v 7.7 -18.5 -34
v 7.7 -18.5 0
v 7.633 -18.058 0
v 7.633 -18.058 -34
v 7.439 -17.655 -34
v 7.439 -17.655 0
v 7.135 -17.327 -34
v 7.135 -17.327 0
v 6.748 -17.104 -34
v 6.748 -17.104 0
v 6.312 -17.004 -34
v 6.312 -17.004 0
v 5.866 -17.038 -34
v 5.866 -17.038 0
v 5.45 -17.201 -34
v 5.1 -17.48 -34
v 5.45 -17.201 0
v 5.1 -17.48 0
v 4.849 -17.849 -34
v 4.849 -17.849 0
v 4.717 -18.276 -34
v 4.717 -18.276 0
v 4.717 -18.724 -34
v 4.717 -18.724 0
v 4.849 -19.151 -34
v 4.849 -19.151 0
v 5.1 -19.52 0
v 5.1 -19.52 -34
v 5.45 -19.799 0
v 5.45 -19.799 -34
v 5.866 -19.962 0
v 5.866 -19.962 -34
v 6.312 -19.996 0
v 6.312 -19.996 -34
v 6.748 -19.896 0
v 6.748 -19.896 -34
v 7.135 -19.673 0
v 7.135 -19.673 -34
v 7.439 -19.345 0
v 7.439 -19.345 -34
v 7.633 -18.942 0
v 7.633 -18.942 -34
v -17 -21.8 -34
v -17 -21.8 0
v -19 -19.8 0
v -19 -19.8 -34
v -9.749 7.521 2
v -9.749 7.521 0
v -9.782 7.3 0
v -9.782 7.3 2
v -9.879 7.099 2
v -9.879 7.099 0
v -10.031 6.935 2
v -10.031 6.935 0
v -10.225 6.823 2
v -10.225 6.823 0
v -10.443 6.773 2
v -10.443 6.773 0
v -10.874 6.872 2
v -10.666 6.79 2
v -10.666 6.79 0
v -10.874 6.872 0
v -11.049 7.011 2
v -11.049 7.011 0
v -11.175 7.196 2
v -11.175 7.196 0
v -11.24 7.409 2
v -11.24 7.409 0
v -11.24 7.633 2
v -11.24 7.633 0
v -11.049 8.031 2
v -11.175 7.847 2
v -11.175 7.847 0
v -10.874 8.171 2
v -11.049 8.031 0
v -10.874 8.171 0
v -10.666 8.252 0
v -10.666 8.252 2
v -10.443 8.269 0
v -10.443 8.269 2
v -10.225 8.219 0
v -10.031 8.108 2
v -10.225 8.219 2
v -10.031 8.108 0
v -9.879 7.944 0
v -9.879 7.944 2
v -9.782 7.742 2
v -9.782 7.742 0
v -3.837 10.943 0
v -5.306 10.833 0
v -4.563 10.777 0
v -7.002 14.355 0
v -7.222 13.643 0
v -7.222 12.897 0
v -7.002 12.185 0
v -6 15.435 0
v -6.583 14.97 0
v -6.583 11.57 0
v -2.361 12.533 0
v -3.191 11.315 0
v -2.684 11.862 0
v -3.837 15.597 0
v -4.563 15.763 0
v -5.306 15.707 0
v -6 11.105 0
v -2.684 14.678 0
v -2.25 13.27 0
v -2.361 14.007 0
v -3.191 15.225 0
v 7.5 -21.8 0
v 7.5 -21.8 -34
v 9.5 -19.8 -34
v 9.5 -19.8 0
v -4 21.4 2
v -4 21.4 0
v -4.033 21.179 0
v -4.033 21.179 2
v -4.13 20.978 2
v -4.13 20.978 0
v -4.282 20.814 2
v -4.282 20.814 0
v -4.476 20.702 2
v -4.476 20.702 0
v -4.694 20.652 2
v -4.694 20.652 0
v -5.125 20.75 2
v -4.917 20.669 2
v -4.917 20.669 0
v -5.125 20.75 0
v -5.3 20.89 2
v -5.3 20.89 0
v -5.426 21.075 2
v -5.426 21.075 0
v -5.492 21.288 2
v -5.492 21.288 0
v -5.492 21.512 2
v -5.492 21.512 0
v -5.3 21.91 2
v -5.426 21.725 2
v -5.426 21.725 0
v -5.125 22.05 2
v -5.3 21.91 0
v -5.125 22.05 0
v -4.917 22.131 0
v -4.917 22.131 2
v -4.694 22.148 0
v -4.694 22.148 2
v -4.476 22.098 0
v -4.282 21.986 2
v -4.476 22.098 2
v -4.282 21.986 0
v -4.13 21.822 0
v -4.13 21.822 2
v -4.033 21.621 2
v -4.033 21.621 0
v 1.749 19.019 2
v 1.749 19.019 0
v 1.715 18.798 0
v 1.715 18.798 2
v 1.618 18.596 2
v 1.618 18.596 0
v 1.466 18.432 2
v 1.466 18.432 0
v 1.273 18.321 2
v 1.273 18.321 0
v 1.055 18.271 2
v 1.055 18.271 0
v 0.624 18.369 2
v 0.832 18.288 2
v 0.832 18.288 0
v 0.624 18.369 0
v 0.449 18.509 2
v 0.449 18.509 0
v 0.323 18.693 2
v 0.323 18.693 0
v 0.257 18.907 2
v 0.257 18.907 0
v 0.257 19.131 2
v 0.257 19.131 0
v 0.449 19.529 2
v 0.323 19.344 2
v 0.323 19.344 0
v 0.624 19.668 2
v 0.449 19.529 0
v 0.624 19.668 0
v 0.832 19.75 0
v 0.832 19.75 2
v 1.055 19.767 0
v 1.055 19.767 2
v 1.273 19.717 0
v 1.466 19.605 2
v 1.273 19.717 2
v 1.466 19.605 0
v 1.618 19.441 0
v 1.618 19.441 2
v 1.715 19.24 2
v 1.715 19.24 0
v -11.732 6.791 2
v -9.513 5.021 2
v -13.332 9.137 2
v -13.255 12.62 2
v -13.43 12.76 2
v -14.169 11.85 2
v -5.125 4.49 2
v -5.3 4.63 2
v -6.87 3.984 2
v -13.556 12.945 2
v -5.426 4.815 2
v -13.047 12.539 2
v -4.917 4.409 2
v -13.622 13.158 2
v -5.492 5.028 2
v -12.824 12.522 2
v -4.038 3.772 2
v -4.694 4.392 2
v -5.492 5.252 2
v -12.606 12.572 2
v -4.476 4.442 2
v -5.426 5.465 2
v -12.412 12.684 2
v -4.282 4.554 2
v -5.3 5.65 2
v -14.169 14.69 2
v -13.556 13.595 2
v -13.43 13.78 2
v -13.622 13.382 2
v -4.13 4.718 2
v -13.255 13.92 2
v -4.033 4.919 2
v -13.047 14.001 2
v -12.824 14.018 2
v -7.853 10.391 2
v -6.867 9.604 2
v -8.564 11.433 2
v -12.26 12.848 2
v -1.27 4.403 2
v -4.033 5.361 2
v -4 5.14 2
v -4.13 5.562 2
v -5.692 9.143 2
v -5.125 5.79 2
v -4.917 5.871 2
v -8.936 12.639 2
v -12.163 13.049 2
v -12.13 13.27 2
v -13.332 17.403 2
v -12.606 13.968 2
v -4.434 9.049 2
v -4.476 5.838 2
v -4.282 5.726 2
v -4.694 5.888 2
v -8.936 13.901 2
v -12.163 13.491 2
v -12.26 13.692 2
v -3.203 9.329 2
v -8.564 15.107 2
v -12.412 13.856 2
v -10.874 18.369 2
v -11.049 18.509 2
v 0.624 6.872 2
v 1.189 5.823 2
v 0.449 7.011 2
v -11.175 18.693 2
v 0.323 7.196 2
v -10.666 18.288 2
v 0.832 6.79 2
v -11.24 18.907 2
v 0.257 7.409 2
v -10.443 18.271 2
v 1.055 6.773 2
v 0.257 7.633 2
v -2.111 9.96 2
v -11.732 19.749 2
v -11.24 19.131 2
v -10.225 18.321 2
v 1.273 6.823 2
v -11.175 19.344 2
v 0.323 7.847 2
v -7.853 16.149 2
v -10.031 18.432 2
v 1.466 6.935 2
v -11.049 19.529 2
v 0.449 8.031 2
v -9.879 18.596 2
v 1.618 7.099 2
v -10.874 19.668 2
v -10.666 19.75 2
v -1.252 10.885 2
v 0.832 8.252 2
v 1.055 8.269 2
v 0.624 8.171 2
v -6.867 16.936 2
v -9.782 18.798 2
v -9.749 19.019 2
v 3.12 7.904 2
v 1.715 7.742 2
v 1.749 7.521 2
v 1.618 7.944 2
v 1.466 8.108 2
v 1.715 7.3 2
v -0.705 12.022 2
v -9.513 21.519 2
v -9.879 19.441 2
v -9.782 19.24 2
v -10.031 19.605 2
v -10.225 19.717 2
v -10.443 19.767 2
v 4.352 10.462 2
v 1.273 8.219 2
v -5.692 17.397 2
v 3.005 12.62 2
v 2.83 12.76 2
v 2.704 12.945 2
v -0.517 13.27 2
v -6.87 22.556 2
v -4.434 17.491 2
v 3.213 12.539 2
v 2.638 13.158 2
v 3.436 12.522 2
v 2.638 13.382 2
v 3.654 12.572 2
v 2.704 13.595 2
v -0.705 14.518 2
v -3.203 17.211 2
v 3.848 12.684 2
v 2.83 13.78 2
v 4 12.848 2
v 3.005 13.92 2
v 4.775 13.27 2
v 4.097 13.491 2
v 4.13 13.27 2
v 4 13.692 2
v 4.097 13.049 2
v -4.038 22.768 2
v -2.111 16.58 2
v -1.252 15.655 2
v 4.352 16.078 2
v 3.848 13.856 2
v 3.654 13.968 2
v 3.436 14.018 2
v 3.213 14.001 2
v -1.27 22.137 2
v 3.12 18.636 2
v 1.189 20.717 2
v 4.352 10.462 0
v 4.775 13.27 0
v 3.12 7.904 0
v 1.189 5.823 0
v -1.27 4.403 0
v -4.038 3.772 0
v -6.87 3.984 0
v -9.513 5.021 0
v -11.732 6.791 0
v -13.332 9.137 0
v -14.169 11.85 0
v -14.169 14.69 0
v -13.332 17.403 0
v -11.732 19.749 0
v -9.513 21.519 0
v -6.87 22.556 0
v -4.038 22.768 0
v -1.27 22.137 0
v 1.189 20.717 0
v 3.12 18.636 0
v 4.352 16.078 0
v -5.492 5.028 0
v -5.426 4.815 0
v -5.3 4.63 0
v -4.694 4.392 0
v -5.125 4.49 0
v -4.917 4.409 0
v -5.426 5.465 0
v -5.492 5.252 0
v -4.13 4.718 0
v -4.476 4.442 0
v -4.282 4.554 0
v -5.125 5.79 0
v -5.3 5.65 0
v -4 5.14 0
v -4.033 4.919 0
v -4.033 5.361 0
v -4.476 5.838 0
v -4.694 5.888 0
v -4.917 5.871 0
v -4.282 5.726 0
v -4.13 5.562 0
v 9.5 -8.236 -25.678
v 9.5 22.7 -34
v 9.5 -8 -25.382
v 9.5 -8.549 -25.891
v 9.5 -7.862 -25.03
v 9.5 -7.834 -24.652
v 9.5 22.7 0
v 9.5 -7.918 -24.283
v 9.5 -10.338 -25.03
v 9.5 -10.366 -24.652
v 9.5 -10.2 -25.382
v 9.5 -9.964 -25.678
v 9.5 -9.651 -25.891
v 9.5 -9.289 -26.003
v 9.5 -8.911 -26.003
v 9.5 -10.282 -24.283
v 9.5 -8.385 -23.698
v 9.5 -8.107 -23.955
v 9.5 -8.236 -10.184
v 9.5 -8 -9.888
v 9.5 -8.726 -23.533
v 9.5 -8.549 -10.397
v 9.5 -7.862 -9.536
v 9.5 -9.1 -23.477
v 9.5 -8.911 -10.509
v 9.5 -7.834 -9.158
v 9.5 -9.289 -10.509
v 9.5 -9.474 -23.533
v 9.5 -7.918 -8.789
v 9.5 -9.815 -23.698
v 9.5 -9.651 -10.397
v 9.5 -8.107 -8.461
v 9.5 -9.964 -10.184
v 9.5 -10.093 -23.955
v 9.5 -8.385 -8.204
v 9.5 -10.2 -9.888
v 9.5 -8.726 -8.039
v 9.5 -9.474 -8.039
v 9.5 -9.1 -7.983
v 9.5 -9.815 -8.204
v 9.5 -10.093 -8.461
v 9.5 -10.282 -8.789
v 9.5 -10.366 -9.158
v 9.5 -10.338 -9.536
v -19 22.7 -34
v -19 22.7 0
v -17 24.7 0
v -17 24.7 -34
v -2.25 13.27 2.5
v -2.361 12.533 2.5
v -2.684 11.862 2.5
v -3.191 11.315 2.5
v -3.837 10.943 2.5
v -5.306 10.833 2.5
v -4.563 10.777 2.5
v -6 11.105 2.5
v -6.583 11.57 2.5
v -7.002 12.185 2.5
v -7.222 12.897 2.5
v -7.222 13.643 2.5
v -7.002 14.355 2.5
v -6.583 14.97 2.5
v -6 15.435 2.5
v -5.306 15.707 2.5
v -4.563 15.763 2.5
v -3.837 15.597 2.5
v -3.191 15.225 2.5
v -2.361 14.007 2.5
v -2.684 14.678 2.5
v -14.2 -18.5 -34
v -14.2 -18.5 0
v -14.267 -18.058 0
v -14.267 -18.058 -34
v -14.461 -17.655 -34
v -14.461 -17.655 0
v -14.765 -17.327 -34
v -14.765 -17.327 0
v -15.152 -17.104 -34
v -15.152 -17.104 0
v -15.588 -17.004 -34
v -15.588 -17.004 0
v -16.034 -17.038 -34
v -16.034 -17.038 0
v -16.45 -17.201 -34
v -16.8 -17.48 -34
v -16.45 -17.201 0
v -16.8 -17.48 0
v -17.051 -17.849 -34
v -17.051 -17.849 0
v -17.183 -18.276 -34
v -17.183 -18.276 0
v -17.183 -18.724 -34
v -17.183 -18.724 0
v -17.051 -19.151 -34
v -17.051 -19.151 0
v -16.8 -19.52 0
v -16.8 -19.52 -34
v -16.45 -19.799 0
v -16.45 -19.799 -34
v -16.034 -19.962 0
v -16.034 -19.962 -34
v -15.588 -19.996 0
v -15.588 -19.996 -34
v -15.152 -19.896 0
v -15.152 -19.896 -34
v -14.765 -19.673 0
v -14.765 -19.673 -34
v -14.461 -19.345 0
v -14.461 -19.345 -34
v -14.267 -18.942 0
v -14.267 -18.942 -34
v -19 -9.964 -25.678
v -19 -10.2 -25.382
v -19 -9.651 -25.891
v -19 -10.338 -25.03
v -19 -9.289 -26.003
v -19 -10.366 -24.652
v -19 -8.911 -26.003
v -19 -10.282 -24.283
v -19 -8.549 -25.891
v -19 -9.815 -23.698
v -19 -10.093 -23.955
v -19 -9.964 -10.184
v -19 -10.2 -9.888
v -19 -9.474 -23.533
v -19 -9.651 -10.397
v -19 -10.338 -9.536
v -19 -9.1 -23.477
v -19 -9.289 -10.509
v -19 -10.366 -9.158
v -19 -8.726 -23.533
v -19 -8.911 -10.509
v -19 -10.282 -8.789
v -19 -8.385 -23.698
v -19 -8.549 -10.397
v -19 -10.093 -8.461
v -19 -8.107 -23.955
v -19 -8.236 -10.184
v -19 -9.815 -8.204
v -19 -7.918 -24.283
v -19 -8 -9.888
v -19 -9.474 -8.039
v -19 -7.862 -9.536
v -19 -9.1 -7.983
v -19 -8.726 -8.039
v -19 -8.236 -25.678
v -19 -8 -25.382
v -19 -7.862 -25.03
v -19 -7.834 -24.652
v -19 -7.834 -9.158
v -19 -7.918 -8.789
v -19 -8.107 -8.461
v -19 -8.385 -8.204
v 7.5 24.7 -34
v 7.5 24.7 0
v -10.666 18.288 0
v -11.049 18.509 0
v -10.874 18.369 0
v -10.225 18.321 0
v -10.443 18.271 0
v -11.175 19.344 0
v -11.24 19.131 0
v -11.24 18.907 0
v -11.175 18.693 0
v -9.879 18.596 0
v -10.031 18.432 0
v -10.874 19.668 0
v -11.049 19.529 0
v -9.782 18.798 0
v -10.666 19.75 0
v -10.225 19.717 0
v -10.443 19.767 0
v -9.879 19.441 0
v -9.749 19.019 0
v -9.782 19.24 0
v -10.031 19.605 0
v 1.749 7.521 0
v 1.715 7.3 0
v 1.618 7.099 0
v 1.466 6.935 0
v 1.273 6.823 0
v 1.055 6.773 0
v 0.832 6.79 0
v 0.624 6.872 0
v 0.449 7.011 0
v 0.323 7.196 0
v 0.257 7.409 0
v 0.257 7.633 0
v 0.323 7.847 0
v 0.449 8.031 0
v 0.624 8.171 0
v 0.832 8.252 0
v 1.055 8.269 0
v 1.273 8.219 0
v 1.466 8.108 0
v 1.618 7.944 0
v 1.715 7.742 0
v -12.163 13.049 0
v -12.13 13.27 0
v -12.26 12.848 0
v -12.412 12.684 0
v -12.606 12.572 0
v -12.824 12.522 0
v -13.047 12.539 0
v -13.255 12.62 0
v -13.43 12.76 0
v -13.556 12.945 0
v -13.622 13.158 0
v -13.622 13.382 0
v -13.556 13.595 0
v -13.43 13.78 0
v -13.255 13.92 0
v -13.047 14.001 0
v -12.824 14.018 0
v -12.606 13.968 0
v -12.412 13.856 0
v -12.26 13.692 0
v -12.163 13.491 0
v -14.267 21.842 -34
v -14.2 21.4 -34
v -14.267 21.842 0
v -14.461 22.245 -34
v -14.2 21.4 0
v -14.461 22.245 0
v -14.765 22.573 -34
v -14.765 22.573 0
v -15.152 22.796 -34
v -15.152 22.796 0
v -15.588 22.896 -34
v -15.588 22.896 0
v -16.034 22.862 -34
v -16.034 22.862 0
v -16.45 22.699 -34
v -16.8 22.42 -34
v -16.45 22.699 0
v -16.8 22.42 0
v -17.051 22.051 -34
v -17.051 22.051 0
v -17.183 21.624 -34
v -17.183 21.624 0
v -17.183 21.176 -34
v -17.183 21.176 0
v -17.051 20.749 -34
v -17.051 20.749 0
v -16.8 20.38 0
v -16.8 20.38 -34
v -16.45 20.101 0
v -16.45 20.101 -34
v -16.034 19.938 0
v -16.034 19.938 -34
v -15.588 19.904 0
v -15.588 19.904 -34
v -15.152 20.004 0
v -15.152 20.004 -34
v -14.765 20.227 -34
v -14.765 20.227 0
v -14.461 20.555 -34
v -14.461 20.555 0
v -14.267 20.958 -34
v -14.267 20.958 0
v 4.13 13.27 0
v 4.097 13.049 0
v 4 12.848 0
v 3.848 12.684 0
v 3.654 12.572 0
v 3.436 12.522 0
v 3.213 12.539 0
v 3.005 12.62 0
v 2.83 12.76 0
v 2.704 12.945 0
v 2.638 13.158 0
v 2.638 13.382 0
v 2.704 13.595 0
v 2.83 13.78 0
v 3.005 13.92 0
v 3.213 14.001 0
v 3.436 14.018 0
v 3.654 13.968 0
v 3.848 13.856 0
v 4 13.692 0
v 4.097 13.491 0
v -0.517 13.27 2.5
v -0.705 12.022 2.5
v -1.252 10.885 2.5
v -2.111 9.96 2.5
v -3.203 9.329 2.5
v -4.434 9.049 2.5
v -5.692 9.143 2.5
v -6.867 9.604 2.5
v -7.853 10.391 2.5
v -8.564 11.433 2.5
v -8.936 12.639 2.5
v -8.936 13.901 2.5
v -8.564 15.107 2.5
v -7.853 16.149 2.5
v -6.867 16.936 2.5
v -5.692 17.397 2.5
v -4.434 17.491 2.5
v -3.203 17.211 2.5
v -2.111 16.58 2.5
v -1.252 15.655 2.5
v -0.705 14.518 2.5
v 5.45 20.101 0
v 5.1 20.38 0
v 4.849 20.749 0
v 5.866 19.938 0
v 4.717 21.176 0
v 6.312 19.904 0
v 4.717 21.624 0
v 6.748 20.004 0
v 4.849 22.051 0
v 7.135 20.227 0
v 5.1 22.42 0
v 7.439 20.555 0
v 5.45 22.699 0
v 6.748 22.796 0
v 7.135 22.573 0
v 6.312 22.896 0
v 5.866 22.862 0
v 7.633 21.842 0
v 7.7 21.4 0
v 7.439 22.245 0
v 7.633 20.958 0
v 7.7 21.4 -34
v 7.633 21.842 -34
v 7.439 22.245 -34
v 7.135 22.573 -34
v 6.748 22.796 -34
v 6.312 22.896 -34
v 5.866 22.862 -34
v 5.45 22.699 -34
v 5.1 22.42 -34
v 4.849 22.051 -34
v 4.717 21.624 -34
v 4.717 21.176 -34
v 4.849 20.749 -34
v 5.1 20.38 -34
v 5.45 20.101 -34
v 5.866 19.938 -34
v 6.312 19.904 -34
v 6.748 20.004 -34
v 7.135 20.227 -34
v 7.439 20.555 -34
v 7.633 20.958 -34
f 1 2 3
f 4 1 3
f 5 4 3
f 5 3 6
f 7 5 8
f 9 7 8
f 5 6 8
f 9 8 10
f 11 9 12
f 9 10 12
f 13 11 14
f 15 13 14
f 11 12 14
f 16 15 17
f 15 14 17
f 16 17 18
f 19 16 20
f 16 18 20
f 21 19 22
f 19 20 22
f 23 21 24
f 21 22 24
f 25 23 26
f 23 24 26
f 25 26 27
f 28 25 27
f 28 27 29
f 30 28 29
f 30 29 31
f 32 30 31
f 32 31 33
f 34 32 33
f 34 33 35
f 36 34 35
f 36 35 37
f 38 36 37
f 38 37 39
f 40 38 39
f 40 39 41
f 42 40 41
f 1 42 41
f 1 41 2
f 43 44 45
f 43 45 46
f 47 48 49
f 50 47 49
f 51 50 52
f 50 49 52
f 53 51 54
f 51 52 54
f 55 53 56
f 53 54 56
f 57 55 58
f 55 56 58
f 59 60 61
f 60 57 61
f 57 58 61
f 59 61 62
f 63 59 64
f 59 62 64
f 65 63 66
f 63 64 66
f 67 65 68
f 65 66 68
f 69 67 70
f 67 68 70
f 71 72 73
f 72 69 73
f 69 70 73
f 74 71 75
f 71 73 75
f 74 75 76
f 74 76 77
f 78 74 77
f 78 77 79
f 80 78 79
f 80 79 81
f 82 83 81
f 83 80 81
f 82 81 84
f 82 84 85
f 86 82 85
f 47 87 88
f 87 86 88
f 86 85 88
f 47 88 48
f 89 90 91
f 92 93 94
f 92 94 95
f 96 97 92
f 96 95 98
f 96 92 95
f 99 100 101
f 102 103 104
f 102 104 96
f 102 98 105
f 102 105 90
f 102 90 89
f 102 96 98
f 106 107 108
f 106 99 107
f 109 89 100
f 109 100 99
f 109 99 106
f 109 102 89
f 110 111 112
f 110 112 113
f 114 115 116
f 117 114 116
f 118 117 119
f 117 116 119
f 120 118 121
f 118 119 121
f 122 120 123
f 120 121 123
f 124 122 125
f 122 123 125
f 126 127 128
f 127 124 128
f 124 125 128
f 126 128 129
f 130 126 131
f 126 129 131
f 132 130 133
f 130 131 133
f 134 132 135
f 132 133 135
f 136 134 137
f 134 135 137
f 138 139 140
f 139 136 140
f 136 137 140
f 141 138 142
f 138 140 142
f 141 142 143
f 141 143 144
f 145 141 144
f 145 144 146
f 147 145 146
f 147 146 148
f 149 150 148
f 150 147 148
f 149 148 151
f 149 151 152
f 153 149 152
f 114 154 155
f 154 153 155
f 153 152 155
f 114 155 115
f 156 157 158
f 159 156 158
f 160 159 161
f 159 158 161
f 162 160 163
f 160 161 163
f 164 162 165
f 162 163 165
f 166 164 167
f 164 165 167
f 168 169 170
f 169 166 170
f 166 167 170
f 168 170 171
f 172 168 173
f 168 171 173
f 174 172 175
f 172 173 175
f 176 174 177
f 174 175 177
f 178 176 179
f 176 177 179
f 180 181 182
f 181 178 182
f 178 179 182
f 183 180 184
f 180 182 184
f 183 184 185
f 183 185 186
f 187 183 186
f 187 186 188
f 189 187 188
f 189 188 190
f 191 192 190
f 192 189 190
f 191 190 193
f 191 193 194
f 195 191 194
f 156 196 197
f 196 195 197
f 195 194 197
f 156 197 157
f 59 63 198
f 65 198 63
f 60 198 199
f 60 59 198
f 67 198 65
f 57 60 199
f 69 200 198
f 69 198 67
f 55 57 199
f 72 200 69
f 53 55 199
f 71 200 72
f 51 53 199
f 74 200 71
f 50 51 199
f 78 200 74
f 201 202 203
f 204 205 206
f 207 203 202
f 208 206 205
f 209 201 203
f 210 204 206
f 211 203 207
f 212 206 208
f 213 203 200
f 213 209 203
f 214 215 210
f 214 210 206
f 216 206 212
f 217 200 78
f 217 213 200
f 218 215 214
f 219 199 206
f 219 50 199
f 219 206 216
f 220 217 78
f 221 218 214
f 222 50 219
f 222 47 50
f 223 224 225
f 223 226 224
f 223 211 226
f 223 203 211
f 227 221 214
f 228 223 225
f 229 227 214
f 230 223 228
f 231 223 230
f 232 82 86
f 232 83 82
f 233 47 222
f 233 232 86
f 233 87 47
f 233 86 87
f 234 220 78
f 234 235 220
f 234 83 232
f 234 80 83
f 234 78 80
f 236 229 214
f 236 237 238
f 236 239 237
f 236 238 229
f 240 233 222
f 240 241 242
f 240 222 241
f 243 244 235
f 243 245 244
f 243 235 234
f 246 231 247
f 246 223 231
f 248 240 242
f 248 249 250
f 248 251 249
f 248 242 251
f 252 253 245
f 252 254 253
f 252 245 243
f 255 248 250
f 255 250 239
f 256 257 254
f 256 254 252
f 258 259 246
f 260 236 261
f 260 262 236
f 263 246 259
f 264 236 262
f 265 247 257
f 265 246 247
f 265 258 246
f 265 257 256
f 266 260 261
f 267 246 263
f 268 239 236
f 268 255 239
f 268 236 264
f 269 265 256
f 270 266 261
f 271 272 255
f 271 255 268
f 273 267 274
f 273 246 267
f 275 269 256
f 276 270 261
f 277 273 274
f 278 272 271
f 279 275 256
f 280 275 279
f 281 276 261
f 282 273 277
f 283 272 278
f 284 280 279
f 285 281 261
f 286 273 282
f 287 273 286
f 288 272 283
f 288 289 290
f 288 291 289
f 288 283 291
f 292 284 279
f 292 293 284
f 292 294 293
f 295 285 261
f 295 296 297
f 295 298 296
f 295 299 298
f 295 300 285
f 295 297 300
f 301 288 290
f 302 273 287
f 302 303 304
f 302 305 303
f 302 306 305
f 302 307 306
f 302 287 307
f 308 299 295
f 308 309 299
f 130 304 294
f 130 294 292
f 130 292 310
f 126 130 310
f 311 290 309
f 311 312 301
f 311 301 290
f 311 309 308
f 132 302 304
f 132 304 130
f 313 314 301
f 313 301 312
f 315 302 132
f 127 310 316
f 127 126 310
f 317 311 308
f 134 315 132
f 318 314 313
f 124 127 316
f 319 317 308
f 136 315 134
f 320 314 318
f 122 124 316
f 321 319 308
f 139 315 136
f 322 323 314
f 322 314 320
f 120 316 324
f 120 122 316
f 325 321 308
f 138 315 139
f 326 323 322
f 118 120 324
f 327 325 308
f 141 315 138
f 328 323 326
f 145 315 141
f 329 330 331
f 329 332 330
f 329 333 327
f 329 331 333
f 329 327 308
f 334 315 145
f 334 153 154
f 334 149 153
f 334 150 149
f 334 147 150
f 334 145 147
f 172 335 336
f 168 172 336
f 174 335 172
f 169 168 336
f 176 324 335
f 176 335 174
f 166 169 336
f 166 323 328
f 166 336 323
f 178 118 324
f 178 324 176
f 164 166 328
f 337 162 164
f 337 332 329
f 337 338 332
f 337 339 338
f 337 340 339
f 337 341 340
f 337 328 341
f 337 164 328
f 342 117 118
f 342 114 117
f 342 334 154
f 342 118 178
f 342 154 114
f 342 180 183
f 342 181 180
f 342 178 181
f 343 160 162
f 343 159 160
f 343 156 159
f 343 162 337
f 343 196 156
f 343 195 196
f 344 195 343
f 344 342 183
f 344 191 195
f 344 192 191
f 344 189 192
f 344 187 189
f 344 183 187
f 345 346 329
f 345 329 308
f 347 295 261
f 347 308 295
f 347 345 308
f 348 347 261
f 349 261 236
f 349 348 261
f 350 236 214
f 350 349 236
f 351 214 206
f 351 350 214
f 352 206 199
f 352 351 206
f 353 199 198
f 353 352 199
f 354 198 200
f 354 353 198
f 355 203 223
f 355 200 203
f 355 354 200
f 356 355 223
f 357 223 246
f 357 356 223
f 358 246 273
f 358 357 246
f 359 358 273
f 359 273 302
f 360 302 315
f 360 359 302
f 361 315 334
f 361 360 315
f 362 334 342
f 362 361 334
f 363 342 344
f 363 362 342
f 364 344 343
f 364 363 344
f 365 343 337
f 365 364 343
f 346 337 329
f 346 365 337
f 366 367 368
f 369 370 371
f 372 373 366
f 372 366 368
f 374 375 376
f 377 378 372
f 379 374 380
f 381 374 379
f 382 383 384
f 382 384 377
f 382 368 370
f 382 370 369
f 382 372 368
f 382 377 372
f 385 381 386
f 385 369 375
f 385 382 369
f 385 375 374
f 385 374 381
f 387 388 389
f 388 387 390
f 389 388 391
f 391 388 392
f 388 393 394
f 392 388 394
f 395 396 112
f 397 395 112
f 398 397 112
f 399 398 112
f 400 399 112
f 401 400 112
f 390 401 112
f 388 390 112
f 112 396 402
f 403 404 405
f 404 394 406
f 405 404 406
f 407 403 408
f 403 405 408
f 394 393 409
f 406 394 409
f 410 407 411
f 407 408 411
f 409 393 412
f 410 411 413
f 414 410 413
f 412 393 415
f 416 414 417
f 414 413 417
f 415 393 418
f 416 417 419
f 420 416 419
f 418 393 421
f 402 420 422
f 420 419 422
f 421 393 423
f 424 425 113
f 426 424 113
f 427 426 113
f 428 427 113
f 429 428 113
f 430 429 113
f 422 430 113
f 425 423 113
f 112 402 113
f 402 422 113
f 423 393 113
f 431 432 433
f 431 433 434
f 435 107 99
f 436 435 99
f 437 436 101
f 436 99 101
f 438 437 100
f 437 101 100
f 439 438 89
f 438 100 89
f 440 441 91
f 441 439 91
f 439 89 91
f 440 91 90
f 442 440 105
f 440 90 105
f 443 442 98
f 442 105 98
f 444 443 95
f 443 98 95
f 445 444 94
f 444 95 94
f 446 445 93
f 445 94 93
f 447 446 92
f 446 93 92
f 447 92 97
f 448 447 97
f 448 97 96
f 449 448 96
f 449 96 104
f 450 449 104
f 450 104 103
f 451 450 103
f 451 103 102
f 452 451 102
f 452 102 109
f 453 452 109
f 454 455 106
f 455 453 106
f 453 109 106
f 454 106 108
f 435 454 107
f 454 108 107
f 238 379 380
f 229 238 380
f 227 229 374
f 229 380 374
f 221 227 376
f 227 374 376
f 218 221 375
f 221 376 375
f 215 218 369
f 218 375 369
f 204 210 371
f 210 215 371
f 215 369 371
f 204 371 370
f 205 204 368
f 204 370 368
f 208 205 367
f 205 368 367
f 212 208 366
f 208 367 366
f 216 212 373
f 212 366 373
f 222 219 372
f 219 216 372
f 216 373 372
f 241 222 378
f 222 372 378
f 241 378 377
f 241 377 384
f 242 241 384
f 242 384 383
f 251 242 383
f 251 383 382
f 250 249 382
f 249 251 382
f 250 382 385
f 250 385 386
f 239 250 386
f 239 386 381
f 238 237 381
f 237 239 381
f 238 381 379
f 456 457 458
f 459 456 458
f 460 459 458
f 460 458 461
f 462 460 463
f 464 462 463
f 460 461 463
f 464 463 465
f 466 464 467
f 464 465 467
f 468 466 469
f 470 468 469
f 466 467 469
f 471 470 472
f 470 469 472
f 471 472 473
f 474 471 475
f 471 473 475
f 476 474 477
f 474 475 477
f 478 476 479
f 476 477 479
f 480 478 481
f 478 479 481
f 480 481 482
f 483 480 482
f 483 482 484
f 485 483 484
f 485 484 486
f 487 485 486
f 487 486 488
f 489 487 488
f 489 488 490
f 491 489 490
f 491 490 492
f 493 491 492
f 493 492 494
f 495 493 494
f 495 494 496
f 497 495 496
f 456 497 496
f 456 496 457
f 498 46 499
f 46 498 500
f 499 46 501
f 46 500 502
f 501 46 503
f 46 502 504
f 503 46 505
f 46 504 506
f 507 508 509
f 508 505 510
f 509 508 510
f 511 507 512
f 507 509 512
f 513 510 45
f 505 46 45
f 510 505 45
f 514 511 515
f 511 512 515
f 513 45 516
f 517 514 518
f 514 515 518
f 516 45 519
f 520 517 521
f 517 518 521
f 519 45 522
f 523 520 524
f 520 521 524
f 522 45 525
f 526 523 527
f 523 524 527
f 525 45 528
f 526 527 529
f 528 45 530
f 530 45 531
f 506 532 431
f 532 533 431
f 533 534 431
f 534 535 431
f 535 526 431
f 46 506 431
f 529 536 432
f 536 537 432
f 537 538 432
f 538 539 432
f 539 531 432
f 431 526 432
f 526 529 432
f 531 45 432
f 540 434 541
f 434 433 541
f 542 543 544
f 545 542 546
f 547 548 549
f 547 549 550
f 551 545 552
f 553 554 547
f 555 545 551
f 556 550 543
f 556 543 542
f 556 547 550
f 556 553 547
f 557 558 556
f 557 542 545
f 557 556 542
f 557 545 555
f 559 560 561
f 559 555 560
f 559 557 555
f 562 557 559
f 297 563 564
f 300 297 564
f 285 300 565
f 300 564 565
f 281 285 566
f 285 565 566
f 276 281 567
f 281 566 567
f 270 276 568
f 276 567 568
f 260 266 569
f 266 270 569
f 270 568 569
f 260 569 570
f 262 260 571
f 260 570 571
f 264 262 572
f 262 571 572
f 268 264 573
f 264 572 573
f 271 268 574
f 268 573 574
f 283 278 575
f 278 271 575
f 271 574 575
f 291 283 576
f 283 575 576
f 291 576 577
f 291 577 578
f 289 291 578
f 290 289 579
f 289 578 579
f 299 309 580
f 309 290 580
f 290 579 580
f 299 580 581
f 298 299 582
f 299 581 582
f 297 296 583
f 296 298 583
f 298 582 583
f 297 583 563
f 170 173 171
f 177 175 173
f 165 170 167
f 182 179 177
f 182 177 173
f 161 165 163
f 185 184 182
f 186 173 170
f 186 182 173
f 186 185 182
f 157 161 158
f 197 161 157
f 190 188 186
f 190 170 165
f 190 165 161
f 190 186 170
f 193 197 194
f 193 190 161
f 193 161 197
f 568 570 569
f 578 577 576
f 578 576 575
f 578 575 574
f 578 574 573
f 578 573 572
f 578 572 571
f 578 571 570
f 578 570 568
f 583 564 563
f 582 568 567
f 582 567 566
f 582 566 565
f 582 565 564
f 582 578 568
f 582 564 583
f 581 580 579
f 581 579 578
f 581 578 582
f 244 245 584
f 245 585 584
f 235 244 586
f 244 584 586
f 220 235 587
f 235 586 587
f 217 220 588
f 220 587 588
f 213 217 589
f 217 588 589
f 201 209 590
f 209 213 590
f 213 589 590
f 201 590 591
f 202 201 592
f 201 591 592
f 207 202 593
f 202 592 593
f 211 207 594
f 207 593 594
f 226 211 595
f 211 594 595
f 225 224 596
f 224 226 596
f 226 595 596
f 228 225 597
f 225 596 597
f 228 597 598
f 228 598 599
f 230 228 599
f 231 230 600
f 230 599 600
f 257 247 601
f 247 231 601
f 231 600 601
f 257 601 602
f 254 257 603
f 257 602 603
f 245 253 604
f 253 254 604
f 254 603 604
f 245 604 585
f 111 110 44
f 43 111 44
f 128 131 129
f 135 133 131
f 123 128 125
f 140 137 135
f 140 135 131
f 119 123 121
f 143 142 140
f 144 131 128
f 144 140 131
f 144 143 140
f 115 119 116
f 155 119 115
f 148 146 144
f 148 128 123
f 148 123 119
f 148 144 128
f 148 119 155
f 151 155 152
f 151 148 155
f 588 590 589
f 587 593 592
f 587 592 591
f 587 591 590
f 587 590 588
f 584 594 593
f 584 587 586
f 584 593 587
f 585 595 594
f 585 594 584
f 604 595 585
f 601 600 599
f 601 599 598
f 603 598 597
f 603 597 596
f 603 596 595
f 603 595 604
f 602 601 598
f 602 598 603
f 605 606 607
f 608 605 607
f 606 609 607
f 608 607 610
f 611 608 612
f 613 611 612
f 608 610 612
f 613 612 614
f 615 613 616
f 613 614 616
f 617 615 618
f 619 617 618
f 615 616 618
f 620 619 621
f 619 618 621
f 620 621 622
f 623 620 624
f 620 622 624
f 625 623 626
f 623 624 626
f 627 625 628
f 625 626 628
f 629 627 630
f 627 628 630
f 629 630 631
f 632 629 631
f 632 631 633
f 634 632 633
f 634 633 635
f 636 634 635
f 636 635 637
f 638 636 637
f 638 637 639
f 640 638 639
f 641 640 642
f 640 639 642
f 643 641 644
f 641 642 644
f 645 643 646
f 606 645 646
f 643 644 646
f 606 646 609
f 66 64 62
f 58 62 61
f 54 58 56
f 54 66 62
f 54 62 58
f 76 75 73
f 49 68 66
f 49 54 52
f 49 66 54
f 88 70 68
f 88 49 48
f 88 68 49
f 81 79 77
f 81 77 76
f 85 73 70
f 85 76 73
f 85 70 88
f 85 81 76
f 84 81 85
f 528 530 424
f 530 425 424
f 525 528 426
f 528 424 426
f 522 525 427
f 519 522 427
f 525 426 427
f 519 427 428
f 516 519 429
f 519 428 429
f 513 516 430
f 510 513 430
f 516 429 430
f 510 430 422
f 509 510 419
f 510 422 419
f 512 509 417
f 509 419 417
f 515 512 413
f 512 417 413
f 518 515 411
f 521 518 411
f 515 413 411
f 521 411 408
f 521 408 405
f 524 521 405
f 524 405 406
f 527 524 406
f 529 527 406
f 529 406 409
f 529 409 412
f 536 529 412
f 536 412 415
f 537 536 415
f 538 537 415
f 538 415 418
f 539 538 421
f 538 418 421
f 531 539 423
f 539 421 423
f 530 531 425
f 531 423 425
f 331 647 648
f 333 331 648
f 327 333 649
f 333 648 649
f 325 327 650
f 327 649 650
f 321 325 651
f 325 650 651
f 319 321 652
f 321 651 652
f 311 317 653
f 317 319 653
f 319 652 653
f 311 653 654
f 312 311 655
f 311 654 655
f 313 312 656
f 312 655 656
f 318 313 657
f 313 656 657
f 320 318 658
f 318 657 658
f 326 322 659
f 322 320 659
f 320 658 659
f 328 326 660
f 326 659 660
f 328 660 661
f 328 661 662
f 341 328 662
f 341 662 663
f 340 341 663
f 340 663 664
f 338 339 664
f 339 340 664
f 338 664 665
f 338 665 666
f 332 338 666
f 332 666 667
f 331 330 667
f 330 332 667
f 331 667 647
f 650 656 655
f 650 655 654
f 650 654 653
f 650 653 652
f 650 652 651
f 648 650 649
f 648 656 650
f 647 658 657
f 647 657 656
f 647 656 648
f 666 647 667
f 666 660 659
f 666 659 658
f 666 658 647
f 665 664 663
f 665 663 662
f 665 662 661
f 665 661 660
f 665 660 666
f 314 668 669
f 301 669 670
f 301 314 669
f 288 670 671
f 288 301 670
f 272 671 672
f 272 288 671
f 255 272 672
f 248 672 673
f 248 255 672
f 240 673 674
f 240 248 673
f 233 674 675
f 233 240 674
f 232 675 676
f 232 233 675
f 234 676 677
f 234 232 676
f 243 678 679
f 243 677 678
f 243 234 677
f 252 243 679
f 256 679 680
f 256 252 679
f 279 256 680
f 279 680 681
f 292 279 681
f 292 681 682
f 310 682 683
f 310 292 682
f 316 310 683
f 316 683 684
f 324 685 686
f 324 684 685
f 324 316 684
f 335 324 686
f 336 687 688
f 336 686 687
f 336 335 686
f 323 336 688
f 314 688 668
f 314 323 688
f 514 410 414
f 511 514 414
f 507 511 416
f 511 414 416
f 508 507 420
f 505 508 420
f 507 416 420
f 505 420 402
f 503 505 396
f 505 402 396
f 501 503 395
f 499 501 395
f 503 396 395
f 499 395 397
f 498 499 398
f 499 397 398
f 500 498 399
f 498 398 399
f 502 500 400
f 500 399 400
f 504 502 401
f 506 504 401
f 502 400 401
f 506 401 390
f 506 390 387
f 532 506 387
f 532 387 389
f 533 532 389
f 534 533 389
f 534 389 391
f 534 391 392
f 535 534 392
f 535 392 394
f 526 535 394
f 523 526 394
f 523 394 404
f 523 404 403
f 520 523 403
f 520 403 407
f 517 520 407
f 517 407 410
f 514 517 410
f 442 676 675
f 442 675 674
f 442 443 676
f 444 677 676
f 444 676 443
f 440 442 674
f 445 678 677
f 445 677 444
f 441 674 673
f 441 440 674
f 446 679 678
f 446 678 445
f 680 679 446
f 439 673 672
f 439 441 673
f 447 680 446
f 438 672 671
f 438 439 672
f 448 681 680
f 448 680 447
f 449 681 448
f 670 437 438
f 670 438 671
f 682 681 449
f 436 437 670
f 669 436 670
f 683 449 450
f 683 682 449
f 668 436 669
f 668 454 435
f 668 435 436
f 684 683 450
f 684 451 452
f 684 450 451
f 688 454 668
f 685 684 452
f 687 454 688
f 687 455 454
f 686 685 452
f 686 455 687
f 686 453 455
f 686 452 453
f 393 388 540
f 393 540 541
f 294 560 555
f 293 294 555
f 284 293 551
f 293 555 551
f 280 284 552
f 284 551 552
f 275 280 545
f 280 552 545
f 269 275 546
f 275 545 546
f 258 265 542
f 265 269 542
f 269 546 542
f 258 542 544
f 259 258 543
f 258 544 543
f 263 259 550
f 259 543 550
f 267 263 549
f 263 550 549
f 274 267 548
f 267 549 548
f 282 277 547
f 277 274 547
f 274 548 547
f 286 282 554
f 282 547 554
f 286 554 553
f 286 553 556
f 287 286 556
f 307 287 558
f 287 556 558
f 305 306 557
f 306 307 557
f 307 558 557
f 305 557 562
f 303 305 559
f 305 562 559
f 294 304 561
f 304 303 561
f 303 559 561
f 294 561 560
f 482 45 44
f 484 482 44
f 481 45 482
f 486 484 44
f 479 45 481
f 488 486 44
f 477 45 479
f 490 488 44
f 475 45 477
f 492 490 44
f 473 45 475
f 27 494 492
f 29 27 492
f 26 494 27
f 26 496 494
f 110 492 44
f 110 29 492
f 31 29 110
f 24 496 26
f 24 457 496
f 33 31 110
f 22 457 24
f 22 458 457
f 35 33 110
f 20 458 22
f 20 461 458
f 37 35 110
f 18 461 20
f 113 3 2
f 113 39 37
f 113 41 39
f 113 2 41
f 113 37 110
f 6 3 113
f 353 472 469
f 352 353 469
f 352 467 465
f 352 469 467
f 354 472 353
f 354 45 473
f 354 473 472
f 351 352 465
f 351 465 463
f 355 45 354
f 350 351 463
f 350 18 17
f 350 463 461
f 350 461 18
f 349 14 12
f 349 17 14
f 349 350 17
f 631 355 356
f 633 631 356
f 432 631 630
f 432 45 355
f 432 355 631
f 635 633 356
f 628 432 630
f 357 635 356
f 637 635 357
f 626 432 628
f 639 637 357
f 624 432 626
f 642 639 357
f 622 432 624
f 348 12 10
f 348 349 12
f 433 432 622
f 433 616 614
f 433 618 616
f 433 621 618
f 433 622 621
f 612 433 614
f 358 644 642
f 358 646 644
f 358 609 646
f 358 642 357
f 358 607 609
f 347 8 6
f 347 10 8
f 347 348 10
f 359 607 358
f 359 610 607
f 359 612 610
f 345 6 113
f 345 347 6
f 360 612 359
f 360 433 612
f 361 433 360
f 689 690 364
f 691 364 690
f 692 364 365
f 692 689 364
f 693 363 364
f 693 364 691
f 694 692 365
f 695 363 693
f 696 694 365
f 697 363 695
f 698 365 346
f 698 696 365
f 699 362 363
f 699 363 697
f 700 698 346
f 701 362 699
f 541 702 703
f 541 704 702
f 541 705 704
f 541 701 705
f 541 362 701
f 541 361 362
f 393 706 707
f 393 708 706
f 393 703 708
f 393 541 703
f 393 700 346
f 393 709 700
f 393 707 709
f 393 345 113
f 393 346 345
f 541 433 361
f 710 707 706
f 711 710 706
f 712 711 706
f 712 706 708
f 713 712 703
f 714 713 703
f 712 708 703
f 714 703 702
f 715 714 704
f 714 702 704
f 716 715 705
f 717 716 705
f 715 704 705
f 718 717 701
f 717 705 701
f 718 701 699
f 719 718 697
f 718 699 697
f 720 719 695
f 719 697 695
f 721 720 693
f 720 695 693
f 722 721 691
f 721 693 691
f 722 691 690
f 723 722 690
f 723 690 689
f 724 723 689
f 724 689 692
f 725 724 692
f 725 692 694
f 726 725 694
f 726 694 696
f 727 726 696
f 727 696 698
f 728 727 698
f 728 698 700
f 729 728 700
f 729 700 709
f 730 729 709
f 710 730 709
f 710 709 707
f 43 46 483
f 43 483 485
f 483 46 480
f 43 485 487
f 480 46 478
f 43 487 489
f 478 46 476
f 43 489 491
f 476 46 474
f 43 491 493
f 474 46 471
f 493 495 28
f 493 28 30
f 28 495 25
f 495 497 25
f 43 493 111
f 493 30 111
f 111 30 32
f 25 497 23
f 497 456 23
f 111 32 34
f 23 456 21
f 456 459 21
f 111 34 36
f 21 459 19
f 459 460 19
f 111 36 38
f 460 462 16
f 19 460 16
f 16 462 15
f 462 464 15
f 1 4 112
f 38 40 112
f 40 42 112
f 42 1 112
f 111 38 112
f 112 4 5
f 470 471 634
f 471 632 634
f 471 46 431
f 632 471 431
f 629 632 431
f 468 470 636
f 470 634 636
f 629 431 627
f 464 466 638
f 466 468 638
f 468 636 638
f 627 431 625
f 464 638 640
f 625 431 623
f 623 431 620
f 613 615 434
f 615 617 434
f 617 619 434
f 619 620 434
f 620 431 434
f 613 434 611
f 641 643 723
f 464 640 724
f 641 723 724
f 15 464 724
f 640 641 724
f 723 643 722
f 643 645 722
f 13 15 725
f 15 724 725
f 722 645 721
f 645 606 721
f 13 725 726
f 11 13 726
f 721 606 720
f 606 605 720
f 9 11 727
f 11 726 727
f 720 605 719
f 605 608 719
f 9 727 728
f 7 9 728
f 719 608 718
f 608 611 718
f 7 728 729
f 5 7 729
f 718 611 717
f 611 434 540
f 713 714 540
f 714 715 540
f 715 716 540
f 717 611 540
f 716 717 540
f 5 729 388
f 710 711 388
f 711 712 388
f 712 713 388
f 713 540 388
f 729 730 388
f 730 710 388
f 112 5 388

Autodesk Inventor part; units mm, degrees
ref_plane "YZ Plane" through (0, 0, 0) normal (1, 0, 0) x (0, 1, 0)
ref_plane "XZ Plane" through (0, 0, 0) normal (0, 1, 0) x (-1, 0, 0)
ref_plane "XY Plane" through (0, 0, 0) normal (0, 0, 1) x (1, 0, 0)
sketch "Sketch1" plane through (0, 0, 0) normal (0, 0, 1) x (1, 0, 0)
  line L0 (-19, 24.7) -> (9.5, 24.7)
  line L1 (9.5, 24.7) -> (9.5, -21.8)
  line L2 (9.5, -21.8) -> (-19, -21.8)
  line L3 (-19, -21.8) -> (-19, 24.7)
  line L4 (-19, 21.4) -> (9.5, 21.4) construction
  line L5 (-4.75, 24.7) -> (-4.75, -21.8) construction
  circle A0 centre (-4.75, 13.27) radius 9.525
  circle A1 centre (-15.7, 21.4) radius 1.5
  line L6 (9.5, 1.45) -> (-19, 1.45) construction
  circle A2 centre (6.2, 21.4) radius 1.5
  circle A3 centre (-15.7, -18.5) radius 1.5
  circle A4 centre (6.2, -18.5) radius 1.5
  circle A5 centre (-4.75, 13.27) radius 2.5
  circle A6 centre (-4.75, 13.27) radius 4.2333
  line L7 (-4.75, 13.27) -> (-4.75, 22.795) construction
  circle A7 centre (-4.75, 21.4) radius 0.75
  circle A8 centre (-10.4988, 19.0188) radius 0.75
  circle A9 centre (-12.88, 13.27) radius 0.75
  circle A10 centre (-10.4988, 7.5212) radius 0.75
  circle A11 centre (-4.75, 5.14) radius 0.75
  circle A12 centre (0.9988, 7.5212) radius 0.75
  circle A13 centre (3.38, 13.27) radius 0.75
  circle A14 centre (0.9988, 19.0188) radius 0.75
  point P0 (0, 0)
  dimension "d2" = 19.05
  dimension "d0" = 28.5
  dimension "d1" = 46.5
  dimension "d3" = 11.43
  dimension "d4" = 3.3
  dimension "d5" = 3.3
  dimension "d6" = 3
  dimension "d7" = 5
  dimension "d8" = 8.4667
  dimension "d11" = 360
  dimension "d13" = 1.5
extrude "Extrusion1" add sketch "Sketch1" against normal blind 34 contours L0 L1 L2 L3 | A0 | A5 | A6 | A7 | A8 | A9 | A10 | A11 | A12 | A13 | A14
chamfer "Chamfer1" distance 2 angle 45 4 edges at (9.5, 24.7, -17) (-19, 24.7, -17) (9.5, -21.8, -17) (-19, -21.8, -17)
extrude "Extrusion2" add sketch "Sketch1" along normal blind 2 contours A0 | A6
extrude "Extrusion3" add sketch "Sketch1" along normal blind 2.5 contours A6
sketch "Sketch2" plane through (-19, -19.8, 0) normal (-1, 0, 0) x (0, 0, 1)
  line L0 (0, 42.5) -> (0, 0) projected
  line L1 (0, 10.7) -> (-34, 10.7)
  line L2 (-34, 0) -> (-34, 42.5) projected
  line L3 (-34, -2) -> (0, -2) projected
  circle A0 centre (-9.253, 10.7) radius 1.27
  circle A1 centre (-24.747, 10.7) radius 1.27
  point P0 (0, 19.8)
  dimension "d23" = 12.7
  dimension "d24" = 2.54
  dimension "d25" = 2.54
  dimension "d26" = 15.494
  dimension "d27" = 9.253
  dimension "d28" = 9.253
hole "Hole1" at (-19, -9.1, -9.253) at (-19, -9.1, -24.747) direction (1, 0, 0) diameter 2.54 end through all
equation "\"d28\" = d27"
properties part number "UpperArmServoDynamixelXM430-W350-T"
